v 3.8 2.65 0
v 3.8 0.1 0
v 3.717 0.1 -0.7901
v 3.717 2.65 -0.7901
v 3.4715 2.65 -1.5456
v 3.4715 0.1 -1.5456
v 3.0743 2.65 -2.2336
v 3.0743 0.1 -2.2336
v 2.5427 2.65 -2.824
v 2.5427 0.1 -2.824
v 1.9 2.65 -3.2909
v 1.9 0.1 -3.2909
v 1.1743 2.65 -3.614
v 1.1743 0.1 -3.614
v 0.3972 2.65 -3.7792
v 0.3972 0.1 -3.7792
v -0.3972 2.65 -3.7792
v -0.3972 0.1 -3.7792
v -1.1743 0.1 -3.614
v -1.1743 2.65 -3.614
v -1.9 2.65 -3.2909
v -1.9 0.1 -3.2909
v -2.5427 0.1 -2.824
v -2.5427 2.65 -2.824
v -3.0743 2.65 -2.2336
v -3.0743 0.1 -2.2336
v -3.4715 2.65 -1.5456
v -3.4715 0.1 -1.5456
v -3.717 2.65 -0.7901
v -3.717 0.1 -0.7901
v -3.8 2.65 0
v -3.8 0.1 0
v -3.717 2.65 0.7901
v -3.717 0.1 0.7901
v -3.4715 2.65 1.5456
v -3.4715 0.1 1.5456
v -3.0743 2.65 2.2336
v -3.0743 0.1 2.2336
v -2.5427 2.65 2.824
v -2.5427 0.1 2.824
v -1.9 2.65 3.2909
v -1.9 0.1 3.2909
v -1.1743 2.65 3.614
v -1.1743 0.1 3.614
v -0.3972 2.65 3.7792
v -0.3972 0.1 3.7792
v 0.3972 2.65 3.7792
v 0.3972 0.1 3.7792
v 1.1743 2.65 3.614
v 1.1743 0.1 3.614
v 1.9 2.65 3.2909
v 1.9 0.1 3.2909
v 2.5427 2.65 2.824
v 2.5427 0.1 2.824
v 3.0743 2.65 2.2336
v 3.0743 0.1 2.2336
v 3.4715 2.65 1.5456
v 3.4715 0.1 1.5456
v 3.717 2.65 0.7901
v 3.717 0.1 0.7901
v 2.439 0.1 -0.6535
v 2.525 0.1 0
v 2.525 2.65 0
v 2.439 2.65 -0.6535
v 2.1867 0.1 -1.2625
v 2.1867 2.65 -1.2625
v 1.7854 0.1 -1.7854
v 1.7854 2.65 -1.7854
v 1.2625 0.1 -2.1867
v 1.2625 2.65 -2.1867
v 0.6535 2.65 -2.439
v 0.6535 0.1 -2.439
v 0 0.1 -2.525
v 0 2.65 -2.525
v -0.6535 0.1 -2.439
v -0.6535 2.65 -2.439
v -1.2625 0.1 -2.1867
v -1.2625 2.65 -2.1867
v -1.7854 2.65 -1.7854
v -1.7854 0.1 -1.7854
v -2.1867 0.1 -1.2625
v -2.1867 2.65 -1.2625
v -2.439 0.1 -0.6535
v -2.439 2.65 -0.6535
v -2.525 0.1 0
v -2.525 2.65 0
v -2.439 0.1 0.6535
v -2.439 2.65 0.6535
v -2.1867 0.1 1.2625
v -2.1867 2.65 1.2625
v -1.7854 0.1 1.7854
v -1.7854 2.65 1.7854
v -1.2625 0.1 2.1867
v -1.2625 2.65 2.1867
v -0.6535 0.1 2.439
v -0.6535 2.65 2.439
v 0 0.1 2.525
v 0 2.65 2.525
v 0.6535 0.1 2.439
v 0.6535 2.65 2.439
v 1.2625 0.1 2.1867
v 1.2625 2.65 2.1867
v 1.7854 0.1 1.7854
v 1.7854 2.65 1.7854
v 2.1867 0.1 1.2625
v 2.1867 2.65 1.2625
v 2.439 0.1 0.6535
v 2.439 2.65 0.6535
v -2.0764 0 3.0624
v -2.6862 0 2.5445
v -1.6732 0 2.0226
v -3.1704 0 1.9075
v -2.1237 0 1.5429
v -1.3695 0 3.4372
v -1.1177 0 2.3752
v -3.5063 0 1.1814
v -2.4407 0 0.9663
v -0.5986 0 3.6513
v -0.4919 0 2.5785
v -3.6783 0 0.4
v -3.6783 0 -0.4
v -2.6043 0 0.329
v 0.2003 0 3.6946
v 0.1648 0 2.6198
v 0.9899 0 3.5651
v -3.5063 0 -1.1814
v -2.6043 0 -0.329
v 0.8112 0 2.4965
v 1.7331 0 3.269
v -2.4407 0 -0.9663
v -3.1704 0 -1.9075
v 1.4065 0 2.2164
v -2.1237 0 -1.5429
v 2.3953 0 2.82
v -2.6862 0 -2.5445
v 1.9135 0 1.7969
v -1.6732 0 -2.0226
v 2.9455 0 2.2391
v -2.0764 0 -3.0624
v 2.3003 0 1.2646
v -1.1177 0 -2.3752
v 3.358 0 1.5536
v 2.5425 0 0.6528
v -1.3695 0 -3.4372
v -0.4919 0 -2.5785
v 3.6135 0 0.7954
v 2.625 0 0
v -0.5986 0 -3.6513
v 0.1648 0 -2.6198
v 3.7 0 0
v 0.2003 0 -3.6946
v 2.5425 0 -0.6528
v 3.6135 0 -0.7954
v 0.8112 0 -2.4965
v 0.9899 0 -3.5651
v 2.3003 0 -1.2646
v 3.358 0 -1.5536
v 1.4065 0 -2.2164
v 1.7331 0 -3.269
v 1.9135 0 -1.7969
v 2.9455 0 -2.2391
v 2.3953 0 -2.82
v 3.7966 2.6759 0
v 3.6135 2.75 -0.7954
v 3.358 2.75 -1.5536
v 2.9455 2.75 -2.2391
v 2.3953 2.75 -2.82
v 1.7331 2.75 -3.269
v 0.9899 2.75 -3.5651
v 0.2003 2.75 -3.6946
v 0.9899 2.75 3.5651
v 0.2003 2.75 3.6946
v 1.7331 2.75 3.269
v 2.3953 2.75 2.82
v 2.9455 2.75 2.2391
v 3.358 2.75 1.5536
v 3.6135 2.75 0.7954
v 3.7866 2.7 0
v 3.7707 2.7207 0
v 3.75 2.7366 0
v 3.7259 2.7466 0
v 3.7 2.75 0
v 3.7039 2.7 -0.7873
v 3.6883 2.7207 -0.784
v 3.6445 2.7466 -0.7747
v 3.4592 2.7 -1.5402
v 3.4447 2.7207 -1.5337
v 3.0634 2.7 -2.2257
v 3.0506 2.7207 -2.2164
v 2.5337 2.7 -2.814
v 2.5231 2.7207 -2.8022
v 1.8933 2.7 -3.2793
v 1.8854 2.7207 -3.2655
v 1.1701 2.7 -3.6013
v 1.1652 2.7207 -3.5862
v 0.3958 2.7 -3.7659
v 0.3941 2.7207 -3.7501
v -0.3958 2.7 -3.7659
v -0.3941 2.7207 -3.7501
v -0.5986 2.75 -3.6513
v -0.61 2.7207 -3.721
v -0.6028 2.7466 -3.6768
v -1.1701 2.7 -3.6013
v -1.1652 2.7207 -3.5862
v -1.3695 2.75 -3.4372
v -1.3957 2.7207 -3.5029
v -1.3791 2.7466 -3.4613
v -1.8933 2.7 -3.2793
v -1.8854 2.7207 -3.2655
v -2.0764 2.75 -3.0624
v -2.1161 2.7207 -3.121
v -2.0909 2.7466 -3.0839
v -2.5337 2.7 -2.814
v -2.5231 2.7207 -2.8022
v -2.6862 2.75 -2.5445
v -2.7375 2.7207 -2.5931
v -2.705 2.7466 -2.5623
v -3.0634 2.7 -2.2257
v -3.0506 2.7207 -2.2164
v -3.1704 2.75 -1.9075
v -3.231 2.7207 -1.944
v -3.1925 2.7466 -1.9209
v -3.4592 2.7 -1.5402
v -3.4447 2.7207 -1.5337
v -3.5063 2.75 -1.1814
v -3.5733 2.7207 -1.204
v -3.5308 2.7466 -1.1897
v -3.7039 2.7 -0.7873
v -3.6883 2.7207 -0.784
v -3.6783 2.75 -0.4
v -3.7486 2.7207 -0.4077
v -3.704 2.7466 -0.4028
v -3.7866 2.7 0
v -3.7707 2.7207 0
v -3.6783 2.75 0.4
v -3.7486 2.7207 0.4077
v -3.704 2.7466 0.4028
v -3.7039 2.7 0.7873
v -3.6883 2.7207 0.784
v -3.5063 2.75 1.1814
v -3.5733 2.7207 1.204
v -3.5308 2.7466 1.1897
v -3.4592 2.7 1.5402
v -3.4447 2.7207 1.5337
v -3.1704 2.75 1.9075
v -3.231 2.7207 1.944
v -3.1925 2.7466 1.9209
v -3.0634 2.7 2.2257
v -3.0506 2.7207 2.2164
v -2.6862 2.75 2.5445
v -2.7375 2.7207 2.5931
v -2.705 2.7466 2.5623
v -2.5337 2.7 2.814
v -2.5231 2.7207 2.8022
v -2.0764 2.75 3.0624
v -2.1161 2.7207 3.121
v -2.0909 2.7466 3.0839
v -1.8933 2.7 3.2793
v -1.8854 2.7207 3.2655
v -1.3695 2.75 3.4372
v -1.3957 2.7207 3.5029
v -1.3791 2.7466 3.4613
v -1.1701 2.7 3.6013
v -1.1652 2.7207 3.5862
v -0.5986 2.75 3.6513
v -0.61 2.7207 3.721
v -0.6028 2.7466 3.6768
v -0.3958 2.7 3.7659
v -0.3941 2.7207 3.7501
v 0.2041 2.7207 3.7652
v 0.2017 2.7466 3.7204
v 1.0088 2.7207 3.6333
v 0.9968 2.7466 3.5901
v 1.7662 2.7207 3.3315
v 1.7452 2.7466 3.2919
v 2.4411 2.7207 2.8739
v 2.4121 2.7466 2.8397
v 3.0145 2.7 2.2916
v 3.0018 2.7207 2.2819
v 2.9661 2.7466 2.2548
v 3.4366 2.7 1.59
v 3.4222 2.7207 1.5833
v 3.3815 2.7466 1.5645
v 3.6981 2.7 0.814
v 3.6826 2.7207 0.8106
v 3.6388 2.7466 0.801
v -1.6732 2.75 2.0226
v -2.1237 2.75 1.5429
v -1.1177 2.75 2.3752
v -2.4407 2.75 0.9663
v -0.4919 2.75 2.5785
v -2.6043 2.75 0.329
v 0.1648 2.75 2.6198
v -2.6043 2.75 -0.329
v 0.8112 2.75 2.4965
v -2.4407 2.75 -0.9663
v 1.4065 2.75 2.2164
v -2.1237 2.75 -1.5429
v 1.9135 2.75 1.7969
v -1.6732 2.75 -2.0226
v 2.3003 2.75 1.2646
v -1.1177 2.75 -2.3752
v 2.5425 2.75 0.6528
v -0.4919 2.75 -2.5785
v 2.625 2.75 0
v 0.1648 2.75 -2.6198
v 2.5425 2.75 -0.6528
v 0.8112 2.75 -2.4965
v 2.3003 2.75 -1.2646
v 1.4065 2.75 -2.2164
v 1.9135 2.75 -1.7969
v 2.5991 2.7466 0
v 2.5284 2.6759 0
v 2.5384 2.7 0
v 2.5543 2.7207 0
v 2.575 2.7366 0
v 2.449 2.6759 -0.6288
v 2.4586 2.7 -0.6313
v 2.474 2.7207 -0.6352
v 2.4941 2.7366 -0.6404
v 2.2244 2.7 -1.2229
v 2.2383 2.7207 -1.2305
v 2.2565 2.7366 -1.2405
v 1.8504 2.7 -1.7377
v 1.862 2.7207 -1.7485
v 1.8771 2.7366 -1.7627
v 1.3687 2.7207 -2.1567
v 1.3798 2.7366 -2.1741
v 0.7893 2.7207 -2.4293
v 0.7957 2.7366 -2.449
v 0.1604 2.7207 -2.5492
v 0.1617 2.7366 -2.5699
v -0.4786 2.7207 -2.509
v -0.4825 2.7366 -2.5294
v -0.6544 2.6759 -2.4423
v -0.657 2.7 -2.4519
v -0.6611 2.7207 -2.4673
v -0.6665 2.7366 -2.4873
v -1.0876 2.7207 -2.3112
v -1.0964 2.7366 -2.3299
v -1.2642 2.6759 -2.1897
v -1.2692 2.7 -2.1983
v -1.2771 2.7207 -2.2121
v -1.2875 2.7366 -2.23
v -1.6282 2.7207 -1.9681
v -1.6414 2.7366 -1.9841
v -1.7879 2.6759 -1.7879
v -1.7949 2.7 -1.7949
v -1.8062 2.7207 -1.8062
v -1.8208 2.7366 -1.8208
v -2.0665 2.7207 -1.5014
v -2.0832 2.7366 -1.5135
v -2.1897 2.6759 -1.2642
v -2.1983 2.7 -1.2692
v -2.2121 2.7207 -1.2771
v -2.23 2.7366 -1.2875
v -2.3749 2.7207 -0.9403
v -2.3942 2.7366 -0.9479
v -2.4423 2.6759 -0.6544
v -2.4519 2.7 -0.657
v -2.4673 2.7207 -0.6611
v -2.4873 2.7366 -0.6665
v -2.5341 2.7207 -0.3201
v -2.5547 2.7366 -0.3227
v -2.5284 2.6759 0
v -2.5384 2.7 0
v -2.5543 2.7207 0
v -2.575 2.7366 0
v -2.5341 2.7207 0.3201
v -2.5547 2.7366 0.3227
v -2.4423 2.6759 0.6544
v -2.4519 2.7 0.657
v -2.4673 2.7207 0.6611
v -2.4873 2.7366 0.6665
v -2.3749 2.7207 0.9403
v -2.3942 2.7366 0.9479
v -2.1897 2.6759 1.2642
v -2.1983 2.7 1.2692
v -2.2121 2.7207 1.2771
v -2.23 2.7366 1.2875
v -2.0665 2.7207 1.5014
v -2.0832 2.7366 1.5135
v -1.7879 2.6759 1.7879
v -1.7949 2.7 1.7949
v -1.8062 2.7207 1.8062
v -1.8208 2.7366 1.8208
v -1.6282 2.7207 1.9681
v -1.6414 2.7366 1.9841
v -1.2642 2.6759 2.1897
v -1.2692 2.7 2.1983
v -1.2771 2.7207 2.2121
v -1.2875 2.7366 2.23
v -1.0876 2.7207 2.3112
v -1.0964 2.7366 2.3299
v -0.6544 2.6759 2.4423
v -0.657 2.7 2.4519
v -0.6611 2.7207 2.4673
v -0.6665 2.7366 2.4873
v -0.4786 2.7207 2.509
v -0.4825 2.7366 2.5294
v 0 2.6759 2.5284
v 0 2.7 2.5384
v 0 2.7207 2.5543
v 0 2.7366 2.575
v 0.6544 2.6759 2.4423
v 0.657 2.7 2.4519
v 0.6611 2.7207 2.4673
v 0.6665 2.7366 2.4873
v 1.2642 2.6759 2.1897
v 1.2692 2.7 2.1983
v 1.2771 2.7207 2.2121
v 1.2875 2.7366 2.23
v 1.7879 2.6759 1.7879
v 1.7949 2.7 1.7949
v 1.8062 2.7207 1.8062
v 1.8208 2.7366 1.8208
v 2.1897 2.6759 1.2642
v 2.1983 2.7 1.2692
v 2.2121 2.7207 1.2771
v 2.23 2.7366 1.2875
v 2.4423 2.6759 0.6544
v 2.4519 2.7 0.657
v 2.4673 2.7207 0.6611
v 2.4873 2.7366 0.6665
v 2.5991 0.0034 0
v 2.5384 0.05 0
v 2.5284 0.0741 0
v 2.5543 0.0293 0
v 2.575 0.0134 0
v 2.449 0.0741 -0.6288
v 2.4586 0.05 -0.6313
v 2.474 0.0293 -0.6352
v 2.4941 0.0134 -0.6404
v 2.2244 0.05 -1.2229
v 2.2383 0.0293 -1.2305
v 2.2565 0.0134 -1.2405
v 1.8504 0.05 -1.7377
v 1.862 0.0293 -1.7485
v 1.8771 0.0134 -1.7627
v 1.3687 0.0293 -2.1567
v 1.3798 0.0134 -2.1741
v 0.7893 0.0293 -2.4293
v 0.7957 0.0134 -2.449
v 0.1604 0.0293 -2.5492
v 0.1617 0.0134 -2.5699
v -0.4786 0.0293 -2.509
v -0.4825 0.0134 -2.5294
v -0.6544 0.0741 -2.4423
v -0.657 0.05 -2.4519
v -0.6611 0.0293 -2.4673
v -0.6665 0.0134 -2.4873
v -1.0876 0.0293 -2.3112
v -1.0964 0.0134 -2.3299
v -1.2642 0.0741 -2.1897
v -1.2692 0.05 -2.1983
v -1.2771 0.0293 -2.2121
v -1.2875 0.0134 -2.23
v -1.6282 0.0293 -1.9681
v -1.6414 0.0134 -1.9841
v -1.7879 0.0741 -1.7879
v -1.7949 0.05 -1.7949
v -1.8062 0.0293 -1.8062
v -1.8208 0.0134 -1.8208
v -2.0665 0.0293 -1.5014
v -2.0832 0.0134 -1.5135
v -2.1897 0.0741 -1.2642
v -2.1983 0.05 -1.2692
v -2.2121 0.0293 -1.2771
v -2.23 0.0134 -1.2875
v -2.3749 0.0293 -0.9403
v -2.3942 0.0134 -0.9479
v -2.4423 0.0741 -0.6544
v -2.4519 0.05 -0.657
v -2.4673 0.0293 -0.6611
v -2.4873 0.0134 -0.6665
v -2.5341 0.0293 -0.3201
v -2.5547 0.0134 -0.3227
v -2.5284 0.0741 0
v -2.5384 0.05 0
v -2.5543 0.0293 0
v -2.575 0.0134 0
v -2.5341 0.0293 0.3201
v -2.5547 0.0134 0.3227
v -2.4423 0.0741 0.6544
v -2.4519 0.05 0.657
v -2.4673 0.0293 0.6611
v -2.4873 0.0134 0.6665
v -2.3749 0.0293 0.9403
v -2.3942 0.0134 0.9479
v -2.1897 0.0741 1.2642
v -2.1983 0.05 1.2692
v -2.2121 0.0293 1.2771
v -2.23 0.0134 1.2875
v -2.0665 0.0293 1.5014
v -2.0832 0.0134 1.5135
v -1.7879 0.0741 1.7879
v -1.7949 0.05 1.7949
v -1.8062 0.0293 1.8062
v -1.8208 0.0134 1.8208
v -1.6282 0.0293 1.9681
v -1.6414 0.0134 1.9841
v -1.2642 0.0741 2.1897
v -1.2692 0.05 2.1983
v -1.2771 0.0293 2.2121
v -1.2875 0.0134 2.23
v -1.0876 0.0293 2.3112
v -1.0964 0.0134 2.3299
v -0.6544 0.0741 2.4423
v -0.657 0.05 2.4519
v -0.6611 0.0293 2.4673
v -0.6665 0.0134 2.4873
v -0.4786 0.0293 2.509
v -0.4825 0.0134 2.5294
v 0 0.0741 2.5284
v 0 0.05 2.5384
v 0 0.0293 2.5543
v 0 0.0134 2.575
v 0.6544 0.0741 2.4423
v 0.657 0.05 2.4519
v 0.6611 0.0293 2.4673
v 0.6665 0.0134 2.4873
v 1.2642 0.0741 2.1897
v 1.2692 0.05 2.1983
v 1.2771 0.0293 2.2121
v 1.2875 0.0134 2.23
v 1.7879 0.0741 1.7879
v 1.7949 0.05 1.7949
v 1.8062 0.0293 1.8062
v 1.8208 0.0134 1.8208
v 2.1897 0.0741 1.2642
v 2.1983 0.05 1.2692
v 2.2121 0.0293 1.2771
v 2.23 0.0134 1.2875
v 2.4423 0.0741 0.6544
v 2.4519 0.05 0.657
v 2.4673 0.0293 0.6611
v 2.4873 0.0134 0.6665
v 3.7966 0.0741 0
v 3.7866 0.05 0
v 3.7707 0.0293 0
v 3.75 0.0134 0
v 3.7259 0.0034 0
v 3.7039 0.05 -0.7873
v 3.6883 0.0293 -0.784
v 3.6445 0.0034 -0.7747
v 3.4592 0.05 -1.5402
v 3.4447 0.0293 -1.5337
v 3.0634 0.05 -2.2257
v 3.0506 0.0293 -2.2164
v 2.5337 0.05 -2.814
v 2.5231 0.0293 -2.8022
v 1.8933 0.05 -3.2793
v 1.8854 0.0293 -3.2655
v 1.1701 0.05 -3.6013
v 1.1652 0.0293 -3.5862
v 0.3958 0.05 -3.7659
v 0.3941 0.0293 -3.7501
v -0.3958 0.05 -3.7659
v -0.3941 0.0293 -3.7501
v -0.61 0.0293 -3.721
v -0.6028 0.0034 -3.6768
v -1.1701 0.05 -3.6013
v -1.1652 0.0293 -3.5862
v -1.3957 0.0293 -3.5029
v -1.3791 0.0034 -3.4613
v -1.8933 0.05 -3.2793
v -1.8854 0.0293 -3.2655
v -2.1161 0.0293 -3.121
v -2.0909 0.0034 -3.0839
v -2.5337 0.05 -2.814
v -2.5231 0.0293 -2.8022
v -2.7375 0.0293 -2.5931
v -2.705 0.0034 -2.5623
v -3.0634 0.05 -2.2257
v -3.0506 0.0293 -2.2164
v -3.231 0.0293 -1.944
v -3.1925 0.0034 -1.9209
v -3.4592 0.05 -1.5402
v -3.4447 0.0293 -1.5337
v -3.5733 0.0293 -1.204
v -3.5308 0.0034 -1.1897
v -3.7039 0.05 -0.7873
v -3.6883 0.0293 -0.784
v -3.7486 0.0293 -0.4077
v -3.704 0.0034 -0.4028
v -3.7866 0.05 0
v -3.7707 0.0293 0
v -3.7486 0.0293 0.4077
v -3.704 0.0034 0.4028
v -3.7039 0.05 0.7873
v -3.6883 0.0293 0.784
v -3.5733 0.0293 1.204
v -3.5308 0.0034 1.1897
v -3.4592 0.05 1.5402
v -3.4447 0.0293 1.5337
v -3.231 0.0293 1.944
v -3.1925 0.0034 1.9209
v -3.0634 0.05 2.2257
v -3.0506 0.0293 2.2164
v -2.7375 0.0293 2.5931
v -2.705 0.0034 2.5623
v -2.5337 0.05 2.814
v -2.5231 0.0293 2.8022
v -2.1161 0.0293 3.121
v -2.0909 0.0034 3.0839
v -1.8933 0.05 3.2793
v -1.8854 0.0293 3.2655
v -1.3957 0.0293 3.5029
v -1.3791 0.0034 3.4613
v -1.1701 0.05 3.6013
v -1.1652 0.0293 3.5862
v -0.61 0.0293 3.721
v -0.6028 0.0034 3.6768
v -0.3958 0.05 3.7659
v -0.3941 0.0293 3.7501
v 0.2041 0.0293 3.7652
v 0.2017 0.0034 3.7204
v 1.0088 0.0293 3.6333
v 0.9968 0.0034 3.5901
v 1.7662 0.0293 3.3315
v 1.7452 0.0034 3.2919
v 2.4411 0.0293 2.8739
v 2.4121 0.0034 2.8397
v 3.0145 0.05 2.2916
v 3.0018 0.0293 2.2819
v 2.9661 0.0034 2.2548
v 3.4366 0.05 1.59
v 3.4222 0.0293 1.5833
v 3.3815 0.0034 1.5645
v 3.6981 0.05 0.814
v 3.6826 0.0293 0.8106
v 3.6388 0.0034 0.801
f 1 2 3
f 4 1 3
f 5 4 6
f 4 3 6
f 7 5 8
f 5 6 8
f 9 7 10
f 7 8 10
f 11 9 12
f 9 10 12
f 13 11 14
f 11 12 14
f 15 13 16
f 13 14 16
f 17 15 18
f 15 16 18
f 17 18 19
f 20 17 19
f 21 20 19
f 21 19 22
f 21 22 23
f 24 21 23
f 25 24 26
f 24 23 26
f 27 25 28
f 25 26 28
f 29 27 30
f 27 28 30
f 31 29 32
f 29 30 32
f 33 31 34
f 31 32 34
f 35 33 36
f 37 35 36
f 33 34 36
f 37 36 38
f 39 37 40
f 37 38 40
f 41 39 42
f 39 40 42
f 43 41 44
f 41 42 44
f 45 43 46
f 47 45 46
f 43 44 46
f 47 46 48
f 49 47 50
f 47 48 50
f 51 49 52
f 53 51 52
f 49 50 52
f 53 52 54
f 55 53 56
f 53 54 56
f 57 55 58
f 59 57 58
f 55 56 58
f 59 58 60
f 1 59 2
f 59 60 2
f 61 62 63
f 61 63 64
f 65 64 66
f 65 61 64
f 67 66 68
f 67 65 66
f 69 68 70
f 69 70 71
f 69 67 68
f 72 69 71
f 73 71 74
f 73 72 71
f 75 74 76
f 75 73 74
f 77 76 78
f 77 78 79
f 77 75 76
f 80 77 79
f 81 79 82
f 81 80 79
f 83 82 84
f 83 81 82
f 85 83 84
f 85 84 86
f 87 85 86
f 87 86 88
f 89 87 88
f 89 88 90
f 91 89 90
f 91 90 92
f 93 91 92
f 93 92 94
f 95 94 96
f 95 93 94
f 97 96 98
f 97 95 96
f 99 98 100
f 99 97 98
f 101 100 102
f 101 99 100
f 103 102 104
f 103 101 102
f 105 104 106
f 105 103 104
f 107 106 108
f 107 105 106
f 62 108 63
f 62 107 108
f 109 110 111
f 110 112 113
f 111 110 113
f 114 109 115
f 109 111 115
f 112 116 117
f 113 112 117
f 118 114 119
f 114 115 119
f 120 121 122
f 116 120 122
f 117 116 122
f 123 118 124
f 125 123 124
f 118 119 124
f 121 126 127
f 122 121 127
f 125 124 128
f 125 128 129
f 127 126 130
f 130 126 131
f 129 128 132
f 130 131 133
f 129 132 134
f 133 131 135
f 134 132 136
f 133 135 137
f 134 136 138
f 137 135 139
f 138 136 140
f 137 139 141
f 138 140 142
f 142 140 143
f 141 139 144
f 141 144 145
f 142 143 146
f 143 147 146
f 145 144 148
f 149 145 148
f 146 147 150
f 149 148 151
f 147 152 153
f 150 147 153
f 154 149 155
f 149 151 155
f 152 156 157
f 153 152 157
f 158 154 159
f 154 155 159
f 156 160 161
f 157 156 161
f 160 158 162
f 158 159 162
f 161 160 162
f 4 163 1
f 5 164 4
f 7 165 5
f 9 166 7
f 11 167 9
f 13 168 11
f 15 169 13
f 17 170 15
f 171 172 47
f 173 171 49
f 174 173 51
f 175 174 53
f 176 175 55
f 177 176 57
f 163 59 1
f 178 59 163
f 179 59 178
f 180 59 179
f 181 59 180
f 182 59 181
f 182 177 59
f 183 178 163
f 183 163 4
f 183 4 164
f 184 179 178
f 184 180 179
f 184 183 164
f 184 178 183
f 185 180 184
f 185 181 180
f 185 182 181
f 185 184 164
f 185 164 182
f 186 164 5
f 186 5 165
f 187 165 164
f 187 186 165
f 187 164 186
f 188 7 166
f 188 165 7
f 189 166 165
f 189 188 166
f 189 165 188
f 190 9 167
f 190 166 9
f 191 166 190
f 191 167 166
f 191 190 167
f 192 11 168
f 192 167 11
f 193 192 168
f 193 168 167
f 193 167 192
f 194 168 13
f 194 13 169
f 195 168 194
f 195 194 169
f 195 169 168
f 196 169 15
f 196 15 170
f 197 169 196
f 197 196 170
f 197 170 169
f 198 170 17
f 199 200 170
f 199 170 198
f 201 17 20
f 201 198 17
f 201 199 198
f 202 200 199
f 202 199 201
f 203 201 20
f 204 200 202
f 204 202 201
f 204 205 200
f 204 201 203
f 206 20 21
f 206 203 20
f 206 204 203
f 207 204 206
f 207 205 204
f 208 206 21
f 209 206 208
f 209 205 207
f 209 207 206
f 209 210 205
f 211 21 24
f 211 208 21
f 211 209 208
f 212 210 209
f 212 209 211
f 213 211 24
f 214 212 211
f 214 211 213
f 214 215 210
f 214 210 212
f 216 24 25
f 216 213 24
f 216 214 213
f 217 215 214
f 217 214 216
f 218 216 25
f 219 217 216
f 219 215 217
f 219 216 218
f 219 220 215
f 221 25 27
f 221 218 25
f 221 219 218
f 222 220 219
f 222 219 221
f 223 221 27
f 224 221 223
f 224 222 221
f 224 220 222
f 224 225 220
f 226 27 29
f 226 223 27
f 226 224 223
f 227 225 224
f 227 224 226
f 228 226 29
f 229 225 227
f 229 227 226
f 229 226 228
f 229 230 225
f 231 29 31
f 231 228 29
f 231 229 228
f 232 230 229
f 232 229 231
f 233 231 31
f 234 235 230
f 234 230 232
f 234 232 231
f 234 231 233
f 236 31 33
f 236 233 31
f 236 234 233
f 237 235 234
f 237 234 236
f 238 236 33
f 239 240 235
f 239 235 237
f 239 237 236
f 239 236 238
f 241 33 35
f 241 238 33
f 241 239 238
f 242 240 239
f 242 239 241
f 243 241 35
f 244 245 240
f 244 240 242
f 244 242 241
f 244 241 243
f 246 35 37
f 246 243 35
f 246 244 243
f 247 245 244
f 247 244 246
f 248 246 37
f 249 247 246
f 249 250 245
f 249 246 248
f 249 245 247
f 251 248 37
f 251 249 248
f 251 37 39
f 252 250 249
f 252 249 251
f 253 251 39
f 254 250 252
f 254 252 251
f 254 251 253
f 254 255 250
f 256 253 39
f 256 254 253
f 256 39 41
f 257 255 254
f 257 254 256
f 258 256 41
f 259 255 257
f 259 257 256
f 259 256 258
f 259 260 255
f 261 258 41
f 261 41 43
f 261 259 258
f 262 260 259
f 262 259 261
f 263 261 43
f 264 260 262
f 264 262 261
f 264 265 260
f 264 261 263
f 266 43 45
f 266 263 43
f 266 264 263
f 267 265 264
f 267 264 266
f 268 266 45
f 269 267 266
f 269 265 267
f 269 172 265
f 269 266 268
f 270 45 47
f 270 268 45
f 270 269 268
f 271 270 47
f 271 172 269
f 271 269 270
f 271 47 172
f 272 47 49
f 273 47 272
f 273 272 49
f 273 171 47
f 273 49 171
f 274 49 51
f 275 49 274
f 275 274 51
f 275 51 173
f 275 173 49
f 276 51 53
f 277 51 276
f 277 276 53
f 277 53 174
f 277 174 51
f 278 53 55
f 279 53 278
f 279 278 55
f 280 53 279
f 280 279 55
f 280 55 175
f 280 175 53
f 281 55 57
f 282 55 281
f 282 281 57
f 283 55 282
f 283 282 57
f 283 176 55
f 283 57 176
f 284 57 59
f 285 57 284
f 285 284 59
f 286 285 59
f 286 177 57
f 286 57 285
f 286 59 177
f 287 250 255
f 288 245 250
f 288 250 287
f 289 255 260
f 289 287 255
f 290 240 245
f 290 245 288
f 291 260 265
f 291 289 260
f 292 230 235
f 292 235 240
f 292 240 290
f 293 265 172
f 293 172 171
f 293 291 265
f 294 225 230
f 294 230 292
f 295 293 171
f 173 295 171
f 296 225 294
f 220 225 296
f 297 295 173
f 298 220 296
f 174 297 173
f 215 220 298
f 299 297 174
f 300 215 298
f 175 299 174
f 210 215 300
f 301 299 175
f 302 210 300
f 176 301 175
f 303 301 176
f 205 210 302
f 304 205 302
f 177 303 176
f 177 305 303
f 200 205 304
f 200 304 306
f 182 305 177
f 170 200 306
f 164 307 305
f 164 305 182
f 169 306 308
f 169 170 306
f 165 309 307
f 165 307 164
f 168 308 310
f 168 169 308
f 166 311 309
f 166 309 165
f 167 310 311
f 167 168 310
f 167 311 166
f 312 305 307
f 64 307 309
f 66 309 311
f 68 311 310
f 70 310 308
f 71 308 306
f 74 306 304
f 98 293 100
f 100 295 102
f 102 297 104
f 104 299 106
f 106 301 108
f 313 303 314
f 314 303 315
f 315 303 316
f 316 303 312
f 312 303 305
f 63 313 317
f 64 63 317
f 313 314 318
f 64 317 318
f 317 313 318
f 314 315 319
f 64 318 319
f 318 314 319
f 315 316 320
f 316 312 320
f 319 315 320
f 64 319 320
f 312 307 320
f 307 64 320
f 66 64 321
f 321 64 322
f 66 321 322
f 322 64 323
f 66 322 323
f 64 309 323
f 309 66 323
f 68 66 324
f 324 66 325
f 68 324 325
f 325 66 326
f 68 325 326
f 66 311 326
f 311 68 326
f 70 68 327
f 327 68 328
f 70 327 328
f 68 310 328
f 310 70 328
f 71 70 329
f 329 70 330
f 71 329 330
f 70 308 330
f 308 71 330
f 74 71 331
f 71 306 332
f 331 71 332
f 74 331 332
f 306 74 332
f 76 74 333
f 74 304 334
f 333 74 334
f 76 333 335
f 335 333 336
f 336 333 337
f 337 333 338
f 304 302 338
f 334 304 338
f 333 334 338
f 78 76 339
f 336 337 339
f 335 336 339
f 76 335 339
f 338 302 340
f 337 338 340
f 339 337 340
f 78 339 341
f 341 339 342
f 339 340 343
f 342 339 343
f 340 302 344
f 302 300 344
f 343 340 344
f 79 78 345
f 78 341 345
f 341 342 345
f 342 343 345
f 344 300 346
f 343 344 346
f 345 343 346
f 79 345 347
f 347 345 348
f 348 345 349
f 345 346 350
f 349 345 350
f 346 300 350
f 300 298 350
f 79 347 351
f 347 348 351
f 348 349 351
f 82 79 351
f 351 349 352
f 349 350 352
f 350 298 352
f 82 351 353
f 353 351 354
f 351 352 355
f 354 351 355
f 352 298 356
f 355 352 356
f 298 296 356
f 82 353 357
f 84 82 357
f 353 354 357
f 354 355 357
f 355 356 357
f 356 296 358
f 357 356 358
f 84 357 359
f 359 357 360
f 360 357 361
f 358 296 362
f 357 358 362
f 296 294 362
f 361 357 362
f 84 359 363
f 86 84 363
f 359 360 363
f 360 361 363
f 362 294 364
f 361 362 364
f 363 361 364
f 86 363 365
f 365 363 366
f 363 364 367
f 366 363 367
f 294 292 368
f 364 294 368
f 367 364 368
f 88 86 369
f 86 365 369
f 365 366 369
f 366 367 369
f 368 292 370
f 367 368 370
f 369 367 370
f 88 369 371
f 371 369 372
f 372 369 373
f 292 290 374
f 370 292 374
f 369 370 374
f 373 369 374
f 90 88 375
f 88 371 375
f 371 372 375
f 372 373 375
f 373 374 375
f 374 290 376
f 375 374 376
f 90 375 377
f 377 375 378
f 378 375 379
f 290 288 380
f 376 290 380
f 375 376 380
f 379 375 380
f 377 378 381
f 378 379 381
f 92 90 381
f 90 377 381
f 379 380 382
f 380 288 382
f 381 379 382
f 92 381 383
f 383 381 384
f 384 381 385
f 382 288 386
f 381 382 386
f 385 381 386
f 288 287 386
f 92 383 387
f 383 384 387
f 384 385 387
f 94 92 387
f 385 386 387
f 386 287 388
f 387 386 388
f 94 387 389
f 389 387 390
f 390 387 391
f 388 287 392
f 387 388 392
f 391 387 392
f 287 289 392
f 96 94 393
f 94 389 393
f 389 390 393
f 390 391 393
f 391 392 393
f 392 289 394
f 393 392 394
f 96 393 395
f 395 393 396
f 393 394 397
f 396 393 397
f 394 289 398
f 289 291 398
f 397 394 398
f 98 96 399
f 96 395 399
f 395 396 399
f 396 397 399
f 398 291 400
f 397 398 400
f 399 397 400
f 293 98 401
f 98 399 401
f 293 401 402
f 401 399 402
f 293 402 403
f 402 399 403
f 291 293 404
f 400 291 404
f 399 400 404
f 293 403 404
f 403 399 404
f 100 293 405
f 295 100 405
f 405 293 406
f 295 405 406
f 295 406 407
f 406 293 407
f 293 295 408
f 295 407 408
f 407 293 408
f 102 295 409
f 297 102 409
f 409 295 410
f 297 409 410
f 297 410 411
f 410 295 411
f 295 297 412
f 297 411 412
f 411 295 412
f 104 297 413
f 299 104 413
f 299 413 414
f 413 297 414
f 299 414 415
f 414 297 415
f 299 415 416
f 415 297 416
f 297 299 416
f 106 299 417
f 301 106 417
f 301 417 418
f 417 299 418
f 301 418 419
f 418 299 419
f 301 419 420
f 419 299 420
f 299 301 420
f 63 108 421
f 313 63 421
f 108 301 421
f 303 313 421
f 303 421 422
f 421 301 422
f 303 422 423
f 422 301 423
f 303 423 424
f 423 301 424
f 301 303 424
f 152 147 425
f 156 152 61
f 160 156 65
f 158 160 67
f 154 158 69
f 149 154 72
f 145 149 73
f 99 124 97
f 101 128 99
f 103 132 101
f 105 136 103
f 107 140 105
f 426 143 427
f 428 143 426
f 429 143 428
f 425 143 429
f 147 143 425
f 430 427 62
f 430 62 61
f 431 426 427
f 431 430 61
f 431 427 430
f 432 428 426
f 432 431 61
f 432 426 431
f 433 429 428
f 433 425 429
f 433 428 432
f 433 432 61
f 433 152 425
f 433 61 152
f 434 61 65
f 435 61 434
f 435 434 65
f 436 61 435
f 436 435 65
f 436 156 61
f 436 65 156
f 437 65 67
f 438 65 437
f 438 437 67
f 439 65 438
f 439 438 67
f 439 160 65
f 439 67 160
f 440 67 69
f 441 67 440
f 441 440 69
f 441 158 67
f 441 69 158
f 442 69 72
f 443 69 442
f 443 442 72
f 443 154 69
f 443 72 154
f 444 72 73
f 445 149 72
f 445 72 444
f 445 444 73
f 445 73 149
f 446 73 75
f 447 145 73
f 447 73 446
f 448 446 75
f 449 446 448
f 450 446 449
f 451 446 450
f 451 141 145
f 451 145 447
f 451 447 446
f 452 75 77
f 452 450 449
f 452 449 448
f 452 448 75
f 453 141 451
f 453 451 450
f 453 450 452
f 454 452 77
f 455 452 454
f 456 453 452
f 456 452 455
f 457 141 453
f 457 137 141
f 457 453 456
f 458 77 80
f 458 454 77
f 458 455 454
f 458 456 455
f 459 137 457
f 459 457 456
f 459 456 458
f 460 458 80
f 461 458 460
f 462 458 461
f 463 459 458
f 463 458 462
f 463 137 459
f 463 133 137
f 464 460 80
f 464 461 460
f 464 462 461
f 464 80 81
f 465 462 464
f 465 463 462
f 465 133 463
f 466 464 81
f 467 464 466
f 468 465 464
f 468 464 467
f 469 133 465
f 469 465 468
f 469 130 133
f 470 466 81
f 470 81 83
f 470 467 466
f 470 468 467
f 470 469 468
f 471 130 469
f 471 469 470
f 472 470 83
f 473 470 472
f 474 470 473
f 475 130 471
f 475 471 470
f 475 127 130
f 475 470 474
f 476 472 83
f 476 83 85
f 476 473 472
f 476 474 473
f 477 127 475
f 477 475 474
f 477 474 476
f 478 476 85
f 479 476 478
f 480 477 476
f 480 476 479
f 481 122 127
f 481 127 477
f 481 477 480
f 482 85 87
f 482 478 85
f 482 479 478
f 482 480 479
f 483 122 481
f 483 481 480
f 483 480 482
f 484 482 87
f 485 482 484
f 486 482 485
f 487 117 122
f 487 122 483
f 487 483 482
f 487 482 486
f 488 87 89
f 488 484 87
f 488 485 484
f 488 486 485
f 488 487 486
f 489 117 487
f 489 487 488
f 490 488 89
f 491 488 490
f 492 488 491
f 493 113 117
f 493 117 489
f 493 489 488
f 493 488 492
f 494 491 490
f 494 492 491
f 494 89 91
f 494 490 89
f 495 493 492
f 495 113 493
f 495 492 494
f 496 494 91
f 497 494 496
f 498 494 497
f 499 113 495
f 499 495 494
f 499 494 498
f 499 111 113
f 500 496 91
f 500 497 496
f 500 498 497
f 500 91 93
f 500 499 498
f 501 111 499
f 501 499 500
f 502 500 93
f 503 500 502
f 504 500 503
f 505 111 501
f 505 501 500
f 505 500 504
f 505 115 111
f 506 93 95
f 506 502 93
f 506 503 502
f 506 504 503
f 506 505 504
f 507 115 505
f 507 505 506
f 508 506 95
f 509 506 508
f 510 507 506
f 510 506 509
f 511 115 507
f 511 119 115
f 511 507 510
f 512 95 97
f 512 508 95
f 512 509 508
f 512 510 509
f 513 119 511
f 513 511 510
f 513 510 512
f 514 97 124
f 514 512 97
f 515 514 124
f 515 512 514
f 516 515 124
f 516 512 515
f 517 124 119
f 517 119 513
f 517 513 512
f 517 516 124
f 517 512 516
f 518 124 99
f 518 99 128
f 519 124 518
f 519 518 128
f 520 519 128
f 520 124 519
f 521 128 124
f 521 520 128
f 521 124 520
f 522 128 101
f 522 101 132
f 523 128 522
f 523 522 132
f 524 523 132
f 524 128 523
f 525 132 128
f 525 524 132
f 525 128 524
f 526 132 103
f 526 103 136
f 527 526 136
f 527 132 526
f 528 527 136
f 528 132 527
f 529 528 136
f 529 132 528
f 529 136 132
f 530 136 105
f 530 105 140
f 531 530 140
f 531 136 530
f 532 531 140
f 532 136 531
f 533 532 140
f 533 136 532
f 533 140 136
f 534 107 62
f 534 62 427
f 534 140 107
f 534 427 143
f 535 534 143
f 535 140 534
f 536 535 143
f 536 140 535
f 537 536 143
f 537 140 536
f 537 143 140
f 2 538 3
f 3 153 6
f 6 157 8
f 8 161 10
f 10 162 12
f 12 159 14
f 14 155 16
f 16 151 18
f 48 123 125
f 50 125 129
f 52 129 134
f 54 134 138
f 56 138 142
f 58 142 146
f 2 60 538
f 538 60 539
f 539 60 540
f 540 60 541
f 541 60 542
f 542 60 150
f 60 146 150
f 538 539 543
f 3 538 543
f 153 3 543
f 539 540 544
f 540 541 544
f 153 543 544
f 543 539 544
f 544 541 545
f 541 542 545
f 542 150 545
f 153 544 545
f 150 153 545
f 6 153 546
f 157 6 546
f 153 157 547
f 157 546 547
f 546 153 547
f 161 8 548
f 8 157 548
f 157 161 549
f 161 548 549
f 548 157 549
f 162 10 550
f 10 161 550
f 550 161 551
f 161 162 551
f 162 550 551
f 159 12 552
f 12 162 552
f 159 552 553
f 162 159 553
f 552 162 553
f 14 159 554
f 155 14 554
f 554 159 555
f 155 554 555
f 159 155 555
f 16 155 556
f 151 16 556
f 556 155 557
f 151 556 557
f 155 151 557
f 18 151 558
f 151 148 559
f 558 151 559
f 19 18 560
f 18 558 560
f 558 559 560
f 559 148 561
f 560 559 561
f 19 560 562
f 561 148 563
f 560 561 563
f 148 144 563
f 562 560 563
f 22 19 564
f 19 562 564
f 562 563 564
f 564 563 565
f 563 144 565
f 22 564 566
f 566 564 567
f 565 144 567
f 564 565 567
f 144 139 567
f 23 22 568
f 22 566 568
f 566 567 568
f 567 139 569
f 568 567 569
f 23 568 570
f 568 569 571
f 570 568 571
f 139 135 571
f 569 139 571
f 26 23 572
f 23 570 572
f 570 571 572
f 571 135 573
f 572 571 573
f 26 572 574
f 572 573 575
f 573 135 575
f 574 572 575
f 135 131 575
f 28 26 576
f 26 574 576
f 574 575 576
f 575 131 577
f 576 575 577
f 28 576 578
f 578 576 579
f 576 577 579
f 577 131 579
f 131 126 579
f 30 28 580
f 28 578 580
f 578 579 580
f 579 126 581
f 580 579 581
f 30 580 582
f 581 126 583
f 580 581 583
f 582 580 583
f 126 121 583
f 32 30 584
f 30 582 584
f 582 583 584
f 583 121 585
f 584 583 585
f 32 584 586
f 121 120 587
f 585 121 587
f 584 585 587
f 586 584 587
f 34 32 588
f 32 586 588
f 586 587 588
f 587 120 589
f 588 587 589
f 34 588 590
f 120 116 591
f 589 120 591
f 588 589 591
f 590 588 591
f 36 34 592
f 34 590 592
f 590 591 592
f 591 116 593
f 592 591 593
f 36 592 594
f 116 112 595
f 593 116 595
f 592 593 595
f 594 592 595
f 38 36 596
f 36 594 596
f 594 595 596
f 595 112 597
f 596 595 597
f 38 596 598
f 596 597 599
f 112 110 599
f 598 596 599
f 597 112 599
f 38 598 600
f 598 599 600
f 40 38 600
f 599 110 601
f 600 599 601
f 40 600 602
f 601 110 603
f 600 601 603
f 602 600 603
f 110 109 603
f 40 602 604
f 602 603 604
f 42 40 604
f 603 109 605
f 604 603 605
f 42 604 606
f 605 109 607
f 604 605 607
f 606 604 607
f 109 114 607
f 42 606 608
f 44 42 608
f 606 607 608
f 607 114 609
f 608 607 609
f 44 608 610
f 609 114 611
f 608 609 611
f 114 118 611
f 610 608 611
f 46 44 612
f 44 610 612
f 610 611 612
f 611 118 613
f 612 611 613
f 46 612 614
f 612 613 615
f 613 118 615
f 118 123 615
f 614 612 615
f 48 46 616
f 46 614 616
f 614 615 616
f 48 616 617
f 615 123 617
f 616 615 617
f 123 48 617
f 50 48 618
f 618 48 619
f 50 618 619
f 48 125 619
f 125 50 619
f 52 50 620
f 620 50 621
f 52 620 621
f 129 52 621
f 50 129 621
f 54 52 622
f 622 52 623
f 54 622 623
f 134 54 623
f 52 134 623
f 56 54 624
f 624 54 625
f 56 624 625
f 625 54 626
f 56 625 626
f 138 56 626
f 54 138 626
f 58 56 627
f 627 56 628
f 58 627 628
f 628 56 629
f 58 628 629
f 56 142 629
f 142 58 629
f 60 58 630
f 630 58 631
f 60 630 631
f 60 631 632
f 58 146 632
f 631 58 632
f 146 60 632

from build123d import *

# Parameters (mm, degrees)
SKETCH_1_R      = 3.8
SKETCH_1_R_2    = 2.525
EXTRUDE_1_DEPTH = 2.75
FILLET_1_R      = 0.1


with BuildPart() as part:
    # Эскиз1 → Бобышка-Вытянуть1 (new body)
    with BuildSketch(Plane(origin=(0, 0, 0), x_dir=(1, 0, 0), z_dir=(0, 1, 0))):
        Circle(SKETCH_1_R)
        Circle(SKETCH_1_R_2, mode=Mode.SUBTRACT)
    extrude(amount=EXTRUDE_1_DEPTH)

    # Скругление1
    fillet_1_edges = [part.edges().sort_by_distance(p)[0] for p in [
        (-3.8, 0, 0),
        (-3.8, 2.75, 0),
        (-2.525, 0, 0),
        (-2.525, 2.75, 0),
    ]]
    fillet(fillet_1_edges, radius=FILLET_1_R)


solid = part.part
